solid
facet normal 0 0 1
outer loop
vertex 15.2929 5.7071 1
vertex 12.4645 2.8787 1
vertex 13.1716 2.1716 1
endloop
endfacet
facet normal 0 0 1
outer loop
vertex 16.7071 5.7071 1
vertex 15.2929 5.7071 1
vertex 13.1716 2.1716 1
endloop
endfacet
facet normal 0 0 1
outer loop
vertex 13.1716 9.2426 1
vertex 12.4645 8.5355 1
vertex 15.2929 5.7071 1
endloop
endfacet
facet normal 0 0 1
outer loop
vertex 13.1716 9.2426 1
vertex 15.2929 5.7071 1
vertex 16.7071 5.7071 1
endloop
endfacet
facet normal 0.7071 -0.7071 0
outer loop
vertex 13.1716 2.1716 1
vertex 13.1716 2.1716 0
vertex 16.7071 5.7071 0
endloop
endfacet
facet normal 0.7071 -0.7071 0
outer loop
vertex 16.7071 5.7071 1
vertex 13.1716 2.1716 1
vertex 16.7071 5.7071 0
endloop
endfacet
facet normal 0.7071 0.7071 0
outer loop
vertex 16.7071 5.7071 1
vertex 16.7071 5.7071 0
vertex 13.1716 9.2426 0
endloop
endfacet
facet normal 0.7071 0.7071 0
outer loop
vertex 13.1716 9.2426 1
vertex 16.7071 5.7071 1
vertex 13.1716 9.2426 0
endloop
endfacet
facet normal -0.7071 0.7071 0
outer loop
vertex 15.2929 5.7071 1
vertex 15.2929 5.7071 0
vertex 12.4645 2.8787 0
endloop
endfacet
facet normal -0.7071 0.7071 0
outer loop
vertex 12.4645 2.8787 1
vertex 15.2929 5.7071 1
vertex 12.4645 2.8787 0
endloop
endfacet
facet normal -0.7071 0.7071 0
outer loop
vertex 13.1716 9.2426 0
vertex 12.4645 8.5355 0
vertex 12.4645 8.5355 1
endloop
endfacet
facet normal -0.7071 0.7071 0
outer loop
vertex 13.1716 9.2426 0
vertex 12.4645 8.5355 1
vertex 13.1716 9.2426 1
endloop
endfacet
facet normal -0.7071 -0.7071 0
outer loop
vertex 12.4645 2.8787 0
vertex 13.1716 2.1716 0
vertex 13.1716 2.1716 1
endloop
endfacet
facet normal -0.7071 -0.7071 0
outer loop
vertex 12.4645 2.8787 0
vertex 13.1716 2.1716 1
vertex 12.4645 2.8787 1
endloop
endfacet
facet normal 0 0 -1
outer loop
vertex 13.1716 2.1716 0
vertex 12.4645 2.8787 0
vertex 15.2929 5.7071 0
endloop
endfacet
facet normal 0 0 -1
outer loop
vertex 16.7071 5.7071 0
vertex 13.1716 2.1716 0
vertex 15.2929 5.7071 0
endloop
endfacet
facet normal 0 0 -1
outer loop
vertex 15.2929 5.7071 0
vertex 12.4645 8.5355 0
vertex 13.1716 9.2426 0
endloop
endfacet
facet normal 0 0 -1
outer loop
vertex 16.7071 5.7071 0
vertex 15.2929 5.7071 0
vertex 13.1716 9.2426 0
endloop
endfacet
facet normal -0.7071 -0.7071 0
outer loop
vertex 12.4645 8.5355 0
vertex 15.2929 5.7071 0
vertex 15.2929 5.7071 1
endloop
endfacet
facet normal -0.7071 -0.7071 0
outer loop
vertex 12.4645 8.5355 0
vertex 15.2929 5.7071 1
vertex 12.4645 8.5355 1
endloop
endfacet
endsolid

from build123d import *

# Parameters (mm, degrees)
BOX081_W               = 1
BOX081_H               = 5
BOX081_DEPTH           = 1
BOX081_PLACEMENT_ANGLE = 45
BOX084_W               = 1
BOX084_H               = 4
BOX084_DEPTH           = 1
BOX084_PLACEMENT_ANGLE = 135


with BuildPart() as cube081:
    # Box081 → Box081 (new body)
    with BuildSketch(Plane.XY):
        with Locations((0.5, 2.5)):
            Rectangle(BOX081_W, BOX081_H)
    extrude(amount=BOX081_DEPTH)


with BuildPart() as cube081_1:
    # Box081 placement: moved
    add(cube081.part.rotate(Axis((0, 0, 0), (0, 0, 1)), BOX081_PLACEMENT_ANGLE))


with BuildPart() as lilarrow007:
    # Box084 → Box084 (new body)
    with BuildSketch(Plane.XY):
        with Locations((0.5, 2)):
            Rectangle(BOX084_W, BOX084_H)
    extrude(amount=BOX084_DEPTH)


with BuildPart() as lilarrow007_1:
    # Box084 placement: moved
    add(lilarrow007.part.rotate(Axis((0, 0, 0), (0, 0, 1)), BOX084_PLACEMENT_ANGLE))

    # Fusion015: union Cube081
    add(cube081_1.part)


with BuildPart() as lilarrow007_2:
    # Fusion015 placement: moved
    add(lilarrow007_1.part.moved(Location((16, 5, 0))))


solid = lilarrow007_2.part
